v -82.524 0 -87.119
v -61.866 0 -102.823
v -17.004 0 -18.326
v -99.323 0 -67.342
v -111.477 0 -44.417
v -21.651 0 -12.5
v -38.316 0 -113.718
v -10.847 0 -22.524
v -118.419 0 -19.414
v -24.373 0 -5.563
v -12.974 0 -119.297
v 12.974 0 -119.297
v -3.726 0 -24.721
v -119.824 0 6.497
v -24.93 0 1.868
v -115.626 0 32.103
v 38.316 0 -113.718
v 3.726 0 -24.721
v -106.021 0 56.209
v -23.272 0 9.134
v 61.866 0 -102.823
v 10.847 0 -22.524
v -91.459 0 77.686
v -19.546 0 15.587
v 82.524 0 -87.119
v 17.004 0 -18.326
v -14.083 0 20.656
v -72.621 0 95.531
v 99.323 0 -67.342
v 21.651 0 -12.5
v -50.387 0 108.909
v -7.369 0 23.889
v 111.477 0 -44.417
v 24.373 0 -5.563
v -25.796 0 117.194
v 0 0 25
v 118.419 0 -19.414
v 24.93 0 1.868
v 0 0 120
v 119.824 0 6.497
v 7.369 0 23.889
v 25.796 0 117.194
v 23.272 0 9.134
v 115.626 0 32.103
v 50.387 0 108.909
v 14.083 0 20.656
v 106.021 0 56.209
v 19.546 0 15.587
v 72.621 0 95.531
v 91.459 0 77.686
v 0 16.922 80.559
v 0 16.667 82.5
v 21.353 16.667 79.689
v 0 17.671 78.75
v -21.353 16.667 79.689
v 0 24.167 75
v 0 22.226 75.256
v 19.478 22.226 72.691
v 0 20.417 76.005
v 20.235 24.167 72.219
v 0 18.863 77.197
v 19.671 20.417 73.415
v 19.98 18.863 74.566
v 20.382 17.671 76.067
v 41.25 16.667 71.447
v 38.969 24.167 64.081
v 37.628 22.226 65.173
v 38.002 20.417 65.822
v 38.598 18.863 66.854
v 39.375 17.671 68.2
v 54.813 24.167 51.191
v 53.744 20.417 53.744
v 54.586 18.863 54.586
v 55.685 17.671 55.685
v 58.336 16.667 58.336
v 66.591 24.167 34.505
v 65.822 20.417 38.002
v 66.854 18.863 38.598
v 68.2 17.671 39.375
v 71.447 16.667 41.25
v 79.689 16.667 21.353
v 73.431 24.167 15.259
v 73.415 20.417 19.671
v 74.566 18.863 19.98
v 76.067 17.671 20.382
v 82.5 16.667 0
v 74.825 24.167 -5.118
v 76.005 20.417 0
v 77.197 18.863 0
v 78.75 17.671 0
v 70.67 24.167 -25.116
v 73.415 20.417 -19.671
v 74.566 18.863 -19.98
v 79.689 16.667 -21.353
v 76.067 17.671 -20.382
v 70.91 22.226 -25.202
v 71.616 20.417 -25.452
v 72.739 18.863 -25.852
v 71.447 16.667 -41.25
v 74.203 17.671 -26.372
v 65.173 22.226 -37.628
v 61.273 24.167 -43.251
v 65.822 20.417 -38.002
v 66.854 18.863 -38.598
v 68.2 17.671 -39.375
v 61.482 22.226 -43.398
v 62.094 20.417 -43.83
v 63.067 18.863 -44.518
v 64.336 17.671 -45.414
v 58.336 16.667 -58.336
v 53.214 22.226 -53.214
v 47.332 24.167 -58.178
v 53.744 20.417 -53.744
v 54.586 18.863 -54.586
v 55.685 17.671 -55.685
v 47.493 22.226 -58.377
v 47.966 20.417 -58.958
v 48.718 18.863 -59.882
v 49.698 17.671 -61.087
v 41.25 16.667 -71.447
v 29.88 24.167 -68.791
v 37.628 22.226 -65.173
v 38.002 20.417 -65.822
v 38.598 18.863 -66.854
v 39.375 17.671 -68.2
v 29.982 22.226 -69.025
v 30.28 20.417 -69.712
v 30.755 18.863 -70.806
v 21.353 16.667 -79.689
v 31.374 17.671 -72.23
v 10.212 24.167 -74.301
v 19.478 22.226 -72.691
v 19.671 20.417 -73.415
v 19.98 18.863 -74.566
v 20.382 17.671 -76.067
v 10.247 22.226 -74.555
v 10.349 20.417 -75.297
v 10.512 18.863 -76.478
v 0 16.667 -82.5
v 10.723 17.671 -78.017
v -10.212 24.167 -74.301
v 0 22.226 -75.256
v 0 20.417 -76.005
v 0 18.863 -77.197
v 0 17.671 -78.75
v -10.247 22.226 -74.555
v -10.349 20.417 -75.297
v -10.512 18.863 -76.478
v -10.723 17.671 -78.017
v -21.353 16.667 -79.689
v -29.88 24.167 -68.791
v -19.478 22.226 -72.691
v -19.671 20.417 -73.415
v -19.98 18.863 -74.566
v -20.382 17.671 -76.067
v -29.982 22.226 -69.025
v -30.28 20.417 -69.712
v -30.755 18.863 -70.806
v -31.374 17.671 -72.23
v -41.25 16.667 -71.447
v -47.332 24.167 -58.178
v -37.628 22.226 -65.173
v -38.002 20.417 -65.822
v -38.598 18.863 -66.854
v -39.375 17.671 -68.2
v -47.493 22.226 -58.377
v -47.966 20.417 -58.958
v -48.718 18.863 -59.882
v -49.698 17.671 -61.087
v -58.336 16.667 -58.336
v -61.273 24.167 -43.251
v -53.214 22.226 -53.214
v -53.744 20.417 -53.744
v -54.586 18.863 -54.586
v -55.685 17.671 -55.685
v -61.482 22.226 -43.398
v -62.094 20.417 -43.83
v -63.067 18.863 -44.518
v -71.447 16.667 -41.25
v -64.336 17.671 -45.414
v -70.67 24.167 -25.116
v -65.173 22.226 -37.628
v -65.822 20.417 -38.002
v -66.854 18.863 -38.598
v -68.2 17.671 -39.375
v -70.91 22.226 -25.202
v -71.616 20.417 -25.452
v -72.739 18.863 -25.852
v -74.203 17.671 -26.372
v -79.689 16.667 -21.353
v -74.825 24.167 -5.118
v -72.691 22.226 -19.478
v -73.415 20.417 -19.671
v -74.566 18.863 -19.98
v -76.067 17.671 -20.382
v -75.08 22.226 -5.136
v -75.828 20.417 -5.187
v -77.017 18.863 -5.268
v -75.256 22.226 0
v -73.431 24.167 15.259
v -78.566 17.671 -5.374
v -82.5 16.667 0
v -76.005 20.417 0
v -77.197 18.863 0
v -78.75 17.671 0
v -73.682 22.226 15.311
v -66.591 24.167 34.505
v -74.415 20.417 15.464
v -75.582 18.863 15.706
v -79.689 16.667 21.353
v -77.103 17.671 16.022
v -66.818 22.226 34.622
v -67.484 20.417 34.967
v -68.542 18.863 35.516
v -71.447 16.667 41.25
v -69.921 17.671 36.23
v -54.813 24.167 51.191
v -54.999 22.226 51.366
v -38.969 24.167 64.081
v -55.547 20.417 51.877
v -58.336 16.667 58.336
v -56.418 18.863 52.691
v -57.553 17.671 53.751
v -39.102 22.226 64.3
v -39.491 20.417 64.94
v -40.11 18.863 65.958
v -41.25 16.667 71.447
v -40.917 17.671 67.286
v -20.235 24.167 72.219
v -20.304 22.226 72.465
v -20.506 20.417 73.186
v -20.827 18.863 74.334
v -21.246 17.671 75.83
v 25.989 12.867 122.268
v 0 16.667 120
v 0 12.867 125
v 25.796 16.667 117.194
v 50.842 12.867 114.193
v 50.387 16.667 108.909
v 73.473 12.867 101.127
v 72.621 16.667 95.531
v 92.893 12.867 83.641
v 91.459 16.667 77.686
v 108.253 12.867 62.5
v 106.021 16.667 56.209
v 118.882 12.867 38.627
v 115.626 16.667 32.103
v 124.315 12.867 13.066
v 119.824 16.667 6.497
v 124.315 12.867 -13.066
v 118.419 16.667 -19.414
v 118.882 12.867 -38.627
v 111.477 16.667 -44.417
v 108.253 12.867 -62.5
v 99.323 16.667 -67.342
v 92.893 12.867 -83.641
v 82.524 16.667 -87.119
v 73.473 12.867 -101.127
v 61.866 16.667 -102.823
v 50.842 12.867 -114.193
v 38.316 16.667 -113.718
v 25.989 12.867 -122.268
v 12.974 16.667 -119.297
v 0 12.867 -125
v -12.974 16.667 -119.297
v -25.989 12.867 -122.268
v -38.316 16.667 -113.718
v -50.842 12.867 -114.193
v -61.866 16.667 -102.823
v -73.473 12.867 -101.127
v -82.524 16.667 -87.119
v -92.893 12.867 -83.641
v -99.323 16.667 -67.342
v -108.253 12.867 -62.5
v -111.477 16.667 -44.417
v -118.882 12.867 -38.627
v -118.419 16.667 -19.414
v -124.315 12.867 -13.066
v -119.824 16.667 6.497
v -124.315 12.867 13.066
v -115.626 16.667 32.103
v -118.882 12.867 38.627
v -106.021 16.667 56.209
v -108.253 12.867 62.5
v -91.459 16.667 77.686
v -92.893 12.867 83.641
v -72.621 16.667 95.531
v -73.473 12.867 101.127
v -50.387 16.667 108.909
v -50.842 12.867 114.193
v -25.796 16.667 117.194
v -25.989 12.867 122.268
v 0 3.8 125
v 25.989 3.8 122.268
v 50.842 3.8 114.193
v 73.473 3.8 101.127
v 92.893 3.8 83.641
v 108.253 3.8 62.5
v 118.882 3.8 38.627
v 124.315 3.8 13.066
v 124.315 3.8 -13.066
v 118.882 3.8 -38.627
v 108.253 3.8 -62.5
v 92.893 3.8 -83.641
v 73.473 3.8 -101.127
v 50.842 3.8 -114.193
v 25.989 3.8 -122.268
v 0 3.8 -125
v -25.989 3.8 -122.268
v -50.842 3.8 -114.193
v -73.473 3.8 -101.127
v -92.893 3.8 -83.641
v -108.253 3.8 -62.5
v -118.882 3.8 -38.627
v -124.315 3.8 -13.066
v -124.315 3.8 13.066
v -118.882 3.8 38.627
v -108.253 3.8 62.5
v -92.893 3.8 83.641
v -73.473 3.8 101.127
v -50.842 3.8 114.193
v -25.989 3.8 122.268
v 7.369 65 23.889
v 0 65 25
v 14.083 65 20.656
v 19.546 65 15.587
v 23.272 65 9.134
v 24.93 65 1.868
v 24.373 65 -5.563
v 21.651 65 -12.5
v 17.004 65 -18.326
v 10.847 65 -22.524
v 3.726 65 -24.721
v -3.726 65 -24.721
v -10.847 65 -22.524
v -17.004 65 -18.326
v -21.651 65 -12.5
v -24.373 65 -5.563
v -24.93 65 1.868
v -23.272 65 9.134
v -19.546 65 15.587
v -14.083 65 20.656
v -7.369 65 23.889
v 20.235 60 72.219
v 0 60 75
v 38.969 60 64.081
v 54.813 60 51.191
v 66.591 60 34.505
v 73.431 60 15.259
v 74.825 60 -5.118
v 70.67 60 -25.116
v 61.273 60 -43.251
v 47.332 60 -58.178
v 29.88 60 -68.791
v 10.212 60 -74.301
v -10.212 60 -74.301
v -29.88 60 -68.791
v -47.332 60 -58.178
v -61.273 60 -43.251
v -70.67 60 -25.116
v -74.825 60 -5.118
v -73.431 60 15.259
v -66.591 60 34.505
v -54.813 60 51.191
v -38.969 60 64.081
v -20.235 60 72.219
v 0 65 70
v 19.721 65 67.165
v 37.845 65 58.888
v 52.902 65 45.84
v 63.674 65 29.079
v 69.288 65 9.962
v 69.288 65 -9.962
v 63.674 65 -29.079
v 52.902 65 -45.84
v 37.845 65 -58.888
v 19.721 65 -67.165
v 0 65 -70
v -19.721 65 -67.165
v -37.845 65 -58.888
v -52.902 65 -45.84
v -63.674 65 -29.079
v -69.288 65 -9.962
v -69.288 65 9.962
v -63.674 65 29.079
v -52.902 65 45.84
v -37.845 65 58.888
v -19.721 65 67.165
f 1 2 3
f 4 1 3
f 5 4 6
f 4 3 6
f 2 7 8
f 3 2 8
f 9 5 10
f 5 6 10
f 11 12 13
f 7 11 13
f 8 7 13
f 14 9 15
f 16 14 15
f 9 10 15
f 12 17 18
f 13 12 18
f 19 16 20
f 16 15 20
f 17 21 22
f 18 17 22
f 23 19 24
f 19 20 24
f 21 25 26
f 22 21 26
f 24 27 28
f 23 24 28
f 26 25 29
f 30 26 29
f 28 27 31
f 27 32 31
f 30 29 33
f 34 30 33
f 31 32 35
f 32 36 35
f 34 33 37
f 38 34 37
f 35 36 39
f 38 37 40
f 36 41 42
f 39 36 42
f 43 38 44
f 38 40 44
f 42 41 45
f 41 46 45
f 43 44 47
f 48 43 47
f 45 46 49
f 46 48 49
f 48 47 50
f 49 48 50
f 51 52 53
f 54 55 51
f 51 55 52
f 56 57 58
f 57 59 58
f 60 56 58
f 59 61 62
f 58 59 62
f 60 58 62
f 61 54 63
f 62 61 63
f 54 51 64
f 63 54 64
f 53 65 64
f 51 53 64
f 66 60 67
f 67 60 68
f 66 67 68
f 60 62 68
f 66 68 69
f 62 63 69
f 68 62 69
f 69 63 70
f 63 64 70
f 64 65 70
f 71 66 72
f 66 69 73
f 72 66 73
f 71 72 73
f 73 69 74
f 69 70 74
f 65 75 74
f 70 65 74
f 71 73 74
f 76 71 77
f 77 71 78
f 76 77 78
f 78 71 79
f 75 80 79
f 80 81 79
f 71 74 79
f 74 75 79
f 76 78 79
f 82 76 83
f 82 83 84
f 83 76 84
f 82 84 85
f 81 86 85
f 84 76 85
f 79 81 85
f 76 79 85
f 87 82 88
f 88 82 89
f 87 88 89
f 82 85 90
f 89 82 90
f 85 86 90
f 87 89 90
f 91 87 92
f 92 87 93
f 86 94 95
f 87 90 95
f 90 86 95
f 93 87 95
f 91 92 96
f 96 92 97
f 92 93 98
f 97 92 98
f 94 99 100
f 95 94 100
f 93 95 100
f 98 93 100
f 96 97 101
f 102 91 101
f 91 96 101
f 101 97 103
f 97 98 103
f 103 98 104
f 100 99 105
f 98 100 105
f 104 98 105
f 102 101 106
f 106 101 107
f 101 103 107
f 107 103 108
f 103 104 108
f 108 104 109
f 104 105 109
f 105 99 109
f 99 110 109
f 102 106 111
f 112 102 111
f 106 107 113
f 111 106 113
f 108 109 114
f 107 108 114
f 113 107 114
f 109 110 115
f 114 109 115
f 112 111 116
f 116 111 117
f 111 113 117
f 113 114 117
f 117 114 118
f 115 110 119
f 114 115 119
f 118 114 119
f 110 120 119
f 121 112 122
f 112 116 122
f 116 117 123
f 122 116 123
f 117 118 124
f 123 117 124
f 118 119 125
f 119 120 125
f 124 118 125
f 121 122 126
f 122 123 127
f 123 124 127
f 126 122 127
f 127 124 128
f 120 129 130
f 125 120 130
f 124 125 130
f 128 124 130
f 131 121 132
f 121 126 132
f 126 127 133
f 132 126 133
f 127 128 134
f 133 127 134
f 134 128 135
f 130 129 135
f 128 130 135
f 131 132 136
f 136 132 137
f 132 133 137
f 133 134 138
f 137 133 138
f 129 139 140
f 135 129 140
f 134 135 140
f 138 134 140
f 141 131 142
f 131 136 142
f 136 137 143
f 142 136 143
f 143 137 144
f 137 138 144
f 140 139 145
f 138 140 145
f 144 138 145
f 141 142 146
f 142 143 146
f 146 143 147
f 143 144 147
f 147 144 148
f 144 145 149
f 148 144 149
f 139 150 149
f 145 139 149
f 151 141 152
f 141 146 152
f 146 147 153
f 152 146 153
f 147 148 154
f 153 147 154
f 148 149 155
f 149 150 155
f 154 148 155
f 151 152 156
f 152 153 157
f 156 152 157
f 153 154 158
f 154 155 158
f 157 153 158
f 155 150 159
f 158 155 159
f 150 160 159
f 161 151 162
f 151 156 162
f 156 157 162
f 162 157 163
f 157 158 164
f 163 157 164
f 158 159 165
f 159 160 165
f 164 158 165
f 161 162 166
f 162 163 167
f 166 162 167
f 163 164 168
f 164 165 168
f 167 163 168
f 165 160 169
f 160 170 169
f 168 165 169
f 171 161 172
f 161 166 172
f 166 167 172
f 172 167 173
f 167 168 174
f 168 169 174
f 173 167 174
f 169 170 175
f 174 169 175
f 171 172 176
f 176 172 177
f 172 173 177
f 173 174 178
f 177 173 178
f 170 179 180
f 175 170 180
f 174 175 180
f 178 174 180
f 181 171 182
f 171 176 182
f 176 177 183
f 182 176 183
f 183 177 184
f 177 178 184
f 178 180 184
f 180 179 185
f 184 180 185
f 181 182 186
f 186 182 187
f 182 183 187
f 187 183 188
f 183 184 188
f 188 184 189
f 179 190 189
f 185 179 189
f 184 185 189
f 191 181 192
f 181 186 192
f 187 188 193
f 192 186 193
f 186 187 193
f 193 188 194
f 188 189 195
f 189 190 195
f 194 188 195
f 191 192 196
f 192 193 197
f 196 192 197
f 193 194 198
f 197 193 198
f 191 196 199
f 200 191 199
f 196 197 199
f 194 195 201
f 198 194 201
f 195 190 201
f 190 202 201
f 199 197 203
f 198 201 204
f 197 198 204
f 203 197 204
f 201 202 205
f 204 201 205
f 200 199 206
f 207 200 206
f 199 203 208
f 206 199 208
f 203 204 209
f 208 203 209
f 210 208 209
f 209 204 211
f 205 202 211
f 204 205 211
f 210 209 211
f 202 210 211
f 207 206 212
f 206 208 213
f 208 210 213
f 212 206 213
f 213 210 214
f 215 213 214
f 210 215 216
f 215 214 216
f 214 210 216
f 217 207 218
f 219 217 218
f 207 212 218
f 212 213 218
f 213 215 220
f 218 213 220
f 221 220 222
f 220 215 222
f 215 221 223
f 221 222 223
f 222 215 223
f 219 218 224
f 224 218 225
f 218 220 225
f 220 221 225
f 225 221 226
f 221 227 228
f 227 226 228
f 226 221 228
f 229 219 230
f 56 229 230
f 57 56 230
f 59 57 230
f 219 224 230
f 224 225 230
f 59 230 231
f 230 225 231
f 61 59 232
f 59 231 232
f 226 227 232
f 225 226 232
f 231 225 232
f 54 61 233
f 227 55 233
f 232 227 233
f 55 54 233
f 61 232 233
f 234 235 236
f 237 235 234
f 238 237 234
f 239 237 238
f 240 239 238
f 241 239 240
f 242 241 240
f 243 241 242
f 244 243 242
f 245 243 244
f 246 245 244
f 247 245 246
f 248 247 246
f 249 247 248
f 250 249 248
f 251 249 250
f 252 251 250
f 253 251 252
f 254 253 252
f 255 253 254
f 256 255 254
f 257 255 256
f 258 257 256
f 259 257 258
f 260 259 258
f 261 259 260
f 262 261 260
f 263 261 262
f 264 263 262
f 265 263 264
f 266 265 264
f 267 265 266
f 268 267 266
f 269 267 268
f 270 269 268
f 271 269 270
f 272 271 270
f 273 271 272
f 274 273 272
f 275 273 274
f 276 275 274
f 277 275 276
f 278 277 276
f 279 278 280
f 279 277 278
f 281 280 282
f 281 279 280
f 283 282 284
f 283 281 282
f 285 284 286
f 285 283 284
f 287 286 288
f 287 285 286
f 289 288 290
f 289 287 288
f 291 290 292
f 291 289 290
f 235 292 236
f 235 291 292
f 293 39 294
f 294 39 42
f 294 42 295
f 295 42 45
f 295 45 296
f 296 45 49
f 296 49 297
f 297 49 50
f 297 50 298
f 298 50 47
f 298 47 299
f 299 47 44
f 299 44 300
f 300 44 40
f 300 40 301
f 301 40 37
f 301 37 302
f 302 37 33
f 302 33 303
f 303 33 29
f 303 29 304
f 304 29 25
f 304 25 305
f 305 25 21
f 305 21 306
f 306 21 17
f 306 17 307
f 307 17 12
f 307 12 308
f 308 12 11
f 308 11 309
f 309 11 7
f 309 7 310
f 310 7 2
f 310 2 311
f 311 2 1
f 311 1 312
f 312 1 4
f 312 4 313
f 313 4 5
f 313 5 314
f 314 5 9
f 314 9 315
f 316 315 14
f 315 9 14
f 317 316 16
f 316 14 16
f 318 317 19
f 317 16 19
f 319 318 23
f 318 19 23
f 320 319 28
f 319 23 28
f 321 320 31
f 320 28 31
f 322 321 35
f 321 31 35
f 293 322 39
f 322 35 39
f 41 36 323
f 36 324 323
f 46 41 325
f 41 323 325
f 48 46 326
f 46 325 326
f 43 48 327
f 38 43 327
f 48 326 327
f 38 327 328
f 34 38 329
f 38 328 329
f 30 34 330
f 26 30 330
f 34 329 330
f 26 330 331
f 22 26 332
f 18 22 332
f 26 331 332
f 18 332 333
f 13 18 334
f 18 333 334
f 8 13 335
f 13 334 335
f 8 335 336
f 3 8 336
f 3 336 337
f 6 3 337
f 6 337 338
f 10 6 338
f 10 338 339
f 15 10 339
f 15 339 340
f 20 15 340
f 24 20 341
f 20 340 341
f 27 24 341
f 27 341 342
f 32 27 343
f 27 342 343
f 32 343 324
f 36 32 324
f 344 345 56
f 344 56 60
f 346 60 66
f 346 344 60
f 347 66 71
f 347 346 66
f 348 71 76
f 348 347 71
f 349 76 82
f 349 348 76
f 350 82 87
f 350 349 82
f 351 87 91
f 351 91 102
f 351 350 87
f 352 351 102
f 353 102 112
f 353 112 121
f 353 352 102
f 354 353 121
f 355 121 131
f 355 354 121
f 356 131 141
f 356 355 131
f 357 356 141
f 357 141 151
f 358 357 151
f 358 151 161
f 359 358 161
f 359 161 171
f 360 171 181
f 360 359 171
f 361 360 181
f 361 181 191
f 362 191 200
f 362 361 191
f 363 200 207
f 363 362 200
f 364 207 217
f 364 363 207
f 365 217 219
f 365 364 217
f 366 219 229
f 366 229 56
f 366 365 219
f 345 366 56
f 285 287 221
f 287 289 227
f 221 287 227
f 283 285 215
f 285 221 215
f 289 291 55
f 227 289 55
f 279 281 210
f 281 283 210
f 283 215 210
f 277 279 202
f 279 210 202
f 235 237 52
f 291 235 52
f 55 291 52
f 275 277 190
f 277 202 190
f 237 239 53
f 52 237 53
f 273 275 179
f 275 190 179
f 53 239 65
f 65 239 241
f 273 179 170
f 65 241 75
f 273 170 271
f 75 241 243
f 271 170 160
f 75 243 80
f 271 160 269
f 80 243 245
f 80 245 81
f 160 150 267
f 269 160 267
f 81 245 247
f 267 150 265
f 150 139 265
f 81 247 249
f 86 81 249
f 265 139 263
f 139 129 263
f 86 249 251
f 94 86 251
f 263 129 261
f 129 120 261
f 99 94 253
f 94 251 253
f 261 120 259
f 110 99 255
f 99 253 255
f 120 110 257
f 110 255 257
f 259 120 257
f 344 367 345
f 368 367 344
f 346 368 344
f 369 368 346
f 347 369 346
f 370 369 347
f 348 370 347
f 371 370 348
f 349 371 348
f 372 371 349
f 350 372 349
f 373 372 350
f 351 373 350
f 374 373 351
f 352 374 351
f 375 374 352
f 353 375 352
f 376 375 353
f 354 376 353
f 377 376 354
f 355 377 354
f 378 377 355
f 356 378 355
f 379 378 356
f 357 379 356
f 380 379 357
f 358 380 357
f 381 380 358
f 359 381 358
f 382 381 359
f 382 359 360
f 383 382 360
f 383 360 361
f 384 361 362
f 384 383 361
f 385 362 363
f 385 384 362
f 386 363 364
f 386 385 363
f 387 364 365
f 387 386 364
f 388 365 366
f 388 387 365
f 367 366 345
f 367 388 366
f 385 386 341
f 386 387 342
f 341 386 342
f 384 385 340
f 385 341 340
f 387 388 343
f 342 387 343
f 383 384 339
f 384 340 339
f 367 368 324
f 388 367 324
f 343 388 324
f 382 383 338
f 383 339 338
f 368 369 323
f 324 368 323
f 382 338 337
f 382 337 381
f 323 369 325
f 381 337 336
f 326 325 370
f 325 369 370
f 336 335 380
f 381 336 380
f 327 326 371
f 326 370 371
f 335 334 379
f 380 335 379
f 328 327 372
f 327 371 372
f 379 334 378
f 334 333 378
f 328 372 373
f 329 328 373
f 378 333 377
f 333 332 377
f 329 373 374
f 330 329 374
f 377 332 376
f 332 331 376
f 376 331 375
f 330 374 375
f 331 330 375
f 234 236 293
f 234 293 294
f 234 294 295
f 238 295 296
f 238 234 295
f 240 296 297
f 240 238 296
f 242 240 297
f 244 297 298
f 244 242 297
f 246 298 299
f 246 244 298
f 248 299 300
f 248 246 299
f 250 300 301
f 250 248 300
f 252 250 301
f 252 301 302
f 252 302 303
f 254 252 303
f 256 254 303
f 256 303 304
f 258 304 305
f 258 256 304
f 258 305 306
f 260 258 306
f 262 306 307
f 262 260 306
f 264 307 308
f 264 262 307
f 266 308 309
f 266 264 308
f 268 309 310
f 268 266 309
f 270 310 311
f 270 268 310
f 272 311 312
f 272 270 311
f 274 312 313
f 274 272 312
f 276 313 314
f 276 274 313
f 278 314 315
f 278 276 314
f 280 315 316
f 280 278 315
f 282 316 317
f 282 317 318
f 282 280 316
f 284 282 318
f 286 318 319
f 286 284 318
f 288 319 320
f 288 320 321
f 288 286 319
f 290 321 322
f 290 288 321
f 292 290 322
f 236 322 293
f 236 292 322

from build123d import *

# Parameters (mm, degrees)
F0_W     = 16.6666666667
F0_H     = 50
F0_W_2   = 48.3333333333
F2_R     = 7.5
F3_SIZE  = 5
F4_SIZE2 = 5
F4_SIZE  = 3.8


with BuildPart() as f1:
    # F0 (on Right) → F1 (revolve)
    with BuildSketch(Plane.YZ):
        with Locations((8.3333333333, 100)):
            Rectangle(F0_W, F0_H)
        with Locations((8.3333333333, 50)):
            Rectangle(F0_W, F0_H)
        with Locations((40.8333333333, 50)):
            Rectangle(F0_W_2, F0_H)
    revolve(axis=Axis((0, 32.5, 0), (0, 1, 0)))

    # F2
    f2_edges = [f1.edges().sort_by_distance(p)[0] for p in [
        (0, 16.666667, -75),
    ]]
    fillet(f2_edges, radius=F2_R)

    # F3
    f3_edges = [f1.edges().sort_by_distance(p)[0] for p in [
        (0, 65, -75),
    ]]
    chamfer(f3_edges, length=F3_SIZE)

    # F4
    f4_edges = [f1.edges().sort_by_distance(p)[0] for p in [
        (0, 0, -125),
        (0, 16.666667, -125),
    ]]
    f4_side = f1.faces().sort_by_distance((0, 8.333333, -125))[0]
    chamfer(f4_edges, length=F4_SIZE, length2=F4_SIZE2, reference=f4_side)


solid = f1.part
